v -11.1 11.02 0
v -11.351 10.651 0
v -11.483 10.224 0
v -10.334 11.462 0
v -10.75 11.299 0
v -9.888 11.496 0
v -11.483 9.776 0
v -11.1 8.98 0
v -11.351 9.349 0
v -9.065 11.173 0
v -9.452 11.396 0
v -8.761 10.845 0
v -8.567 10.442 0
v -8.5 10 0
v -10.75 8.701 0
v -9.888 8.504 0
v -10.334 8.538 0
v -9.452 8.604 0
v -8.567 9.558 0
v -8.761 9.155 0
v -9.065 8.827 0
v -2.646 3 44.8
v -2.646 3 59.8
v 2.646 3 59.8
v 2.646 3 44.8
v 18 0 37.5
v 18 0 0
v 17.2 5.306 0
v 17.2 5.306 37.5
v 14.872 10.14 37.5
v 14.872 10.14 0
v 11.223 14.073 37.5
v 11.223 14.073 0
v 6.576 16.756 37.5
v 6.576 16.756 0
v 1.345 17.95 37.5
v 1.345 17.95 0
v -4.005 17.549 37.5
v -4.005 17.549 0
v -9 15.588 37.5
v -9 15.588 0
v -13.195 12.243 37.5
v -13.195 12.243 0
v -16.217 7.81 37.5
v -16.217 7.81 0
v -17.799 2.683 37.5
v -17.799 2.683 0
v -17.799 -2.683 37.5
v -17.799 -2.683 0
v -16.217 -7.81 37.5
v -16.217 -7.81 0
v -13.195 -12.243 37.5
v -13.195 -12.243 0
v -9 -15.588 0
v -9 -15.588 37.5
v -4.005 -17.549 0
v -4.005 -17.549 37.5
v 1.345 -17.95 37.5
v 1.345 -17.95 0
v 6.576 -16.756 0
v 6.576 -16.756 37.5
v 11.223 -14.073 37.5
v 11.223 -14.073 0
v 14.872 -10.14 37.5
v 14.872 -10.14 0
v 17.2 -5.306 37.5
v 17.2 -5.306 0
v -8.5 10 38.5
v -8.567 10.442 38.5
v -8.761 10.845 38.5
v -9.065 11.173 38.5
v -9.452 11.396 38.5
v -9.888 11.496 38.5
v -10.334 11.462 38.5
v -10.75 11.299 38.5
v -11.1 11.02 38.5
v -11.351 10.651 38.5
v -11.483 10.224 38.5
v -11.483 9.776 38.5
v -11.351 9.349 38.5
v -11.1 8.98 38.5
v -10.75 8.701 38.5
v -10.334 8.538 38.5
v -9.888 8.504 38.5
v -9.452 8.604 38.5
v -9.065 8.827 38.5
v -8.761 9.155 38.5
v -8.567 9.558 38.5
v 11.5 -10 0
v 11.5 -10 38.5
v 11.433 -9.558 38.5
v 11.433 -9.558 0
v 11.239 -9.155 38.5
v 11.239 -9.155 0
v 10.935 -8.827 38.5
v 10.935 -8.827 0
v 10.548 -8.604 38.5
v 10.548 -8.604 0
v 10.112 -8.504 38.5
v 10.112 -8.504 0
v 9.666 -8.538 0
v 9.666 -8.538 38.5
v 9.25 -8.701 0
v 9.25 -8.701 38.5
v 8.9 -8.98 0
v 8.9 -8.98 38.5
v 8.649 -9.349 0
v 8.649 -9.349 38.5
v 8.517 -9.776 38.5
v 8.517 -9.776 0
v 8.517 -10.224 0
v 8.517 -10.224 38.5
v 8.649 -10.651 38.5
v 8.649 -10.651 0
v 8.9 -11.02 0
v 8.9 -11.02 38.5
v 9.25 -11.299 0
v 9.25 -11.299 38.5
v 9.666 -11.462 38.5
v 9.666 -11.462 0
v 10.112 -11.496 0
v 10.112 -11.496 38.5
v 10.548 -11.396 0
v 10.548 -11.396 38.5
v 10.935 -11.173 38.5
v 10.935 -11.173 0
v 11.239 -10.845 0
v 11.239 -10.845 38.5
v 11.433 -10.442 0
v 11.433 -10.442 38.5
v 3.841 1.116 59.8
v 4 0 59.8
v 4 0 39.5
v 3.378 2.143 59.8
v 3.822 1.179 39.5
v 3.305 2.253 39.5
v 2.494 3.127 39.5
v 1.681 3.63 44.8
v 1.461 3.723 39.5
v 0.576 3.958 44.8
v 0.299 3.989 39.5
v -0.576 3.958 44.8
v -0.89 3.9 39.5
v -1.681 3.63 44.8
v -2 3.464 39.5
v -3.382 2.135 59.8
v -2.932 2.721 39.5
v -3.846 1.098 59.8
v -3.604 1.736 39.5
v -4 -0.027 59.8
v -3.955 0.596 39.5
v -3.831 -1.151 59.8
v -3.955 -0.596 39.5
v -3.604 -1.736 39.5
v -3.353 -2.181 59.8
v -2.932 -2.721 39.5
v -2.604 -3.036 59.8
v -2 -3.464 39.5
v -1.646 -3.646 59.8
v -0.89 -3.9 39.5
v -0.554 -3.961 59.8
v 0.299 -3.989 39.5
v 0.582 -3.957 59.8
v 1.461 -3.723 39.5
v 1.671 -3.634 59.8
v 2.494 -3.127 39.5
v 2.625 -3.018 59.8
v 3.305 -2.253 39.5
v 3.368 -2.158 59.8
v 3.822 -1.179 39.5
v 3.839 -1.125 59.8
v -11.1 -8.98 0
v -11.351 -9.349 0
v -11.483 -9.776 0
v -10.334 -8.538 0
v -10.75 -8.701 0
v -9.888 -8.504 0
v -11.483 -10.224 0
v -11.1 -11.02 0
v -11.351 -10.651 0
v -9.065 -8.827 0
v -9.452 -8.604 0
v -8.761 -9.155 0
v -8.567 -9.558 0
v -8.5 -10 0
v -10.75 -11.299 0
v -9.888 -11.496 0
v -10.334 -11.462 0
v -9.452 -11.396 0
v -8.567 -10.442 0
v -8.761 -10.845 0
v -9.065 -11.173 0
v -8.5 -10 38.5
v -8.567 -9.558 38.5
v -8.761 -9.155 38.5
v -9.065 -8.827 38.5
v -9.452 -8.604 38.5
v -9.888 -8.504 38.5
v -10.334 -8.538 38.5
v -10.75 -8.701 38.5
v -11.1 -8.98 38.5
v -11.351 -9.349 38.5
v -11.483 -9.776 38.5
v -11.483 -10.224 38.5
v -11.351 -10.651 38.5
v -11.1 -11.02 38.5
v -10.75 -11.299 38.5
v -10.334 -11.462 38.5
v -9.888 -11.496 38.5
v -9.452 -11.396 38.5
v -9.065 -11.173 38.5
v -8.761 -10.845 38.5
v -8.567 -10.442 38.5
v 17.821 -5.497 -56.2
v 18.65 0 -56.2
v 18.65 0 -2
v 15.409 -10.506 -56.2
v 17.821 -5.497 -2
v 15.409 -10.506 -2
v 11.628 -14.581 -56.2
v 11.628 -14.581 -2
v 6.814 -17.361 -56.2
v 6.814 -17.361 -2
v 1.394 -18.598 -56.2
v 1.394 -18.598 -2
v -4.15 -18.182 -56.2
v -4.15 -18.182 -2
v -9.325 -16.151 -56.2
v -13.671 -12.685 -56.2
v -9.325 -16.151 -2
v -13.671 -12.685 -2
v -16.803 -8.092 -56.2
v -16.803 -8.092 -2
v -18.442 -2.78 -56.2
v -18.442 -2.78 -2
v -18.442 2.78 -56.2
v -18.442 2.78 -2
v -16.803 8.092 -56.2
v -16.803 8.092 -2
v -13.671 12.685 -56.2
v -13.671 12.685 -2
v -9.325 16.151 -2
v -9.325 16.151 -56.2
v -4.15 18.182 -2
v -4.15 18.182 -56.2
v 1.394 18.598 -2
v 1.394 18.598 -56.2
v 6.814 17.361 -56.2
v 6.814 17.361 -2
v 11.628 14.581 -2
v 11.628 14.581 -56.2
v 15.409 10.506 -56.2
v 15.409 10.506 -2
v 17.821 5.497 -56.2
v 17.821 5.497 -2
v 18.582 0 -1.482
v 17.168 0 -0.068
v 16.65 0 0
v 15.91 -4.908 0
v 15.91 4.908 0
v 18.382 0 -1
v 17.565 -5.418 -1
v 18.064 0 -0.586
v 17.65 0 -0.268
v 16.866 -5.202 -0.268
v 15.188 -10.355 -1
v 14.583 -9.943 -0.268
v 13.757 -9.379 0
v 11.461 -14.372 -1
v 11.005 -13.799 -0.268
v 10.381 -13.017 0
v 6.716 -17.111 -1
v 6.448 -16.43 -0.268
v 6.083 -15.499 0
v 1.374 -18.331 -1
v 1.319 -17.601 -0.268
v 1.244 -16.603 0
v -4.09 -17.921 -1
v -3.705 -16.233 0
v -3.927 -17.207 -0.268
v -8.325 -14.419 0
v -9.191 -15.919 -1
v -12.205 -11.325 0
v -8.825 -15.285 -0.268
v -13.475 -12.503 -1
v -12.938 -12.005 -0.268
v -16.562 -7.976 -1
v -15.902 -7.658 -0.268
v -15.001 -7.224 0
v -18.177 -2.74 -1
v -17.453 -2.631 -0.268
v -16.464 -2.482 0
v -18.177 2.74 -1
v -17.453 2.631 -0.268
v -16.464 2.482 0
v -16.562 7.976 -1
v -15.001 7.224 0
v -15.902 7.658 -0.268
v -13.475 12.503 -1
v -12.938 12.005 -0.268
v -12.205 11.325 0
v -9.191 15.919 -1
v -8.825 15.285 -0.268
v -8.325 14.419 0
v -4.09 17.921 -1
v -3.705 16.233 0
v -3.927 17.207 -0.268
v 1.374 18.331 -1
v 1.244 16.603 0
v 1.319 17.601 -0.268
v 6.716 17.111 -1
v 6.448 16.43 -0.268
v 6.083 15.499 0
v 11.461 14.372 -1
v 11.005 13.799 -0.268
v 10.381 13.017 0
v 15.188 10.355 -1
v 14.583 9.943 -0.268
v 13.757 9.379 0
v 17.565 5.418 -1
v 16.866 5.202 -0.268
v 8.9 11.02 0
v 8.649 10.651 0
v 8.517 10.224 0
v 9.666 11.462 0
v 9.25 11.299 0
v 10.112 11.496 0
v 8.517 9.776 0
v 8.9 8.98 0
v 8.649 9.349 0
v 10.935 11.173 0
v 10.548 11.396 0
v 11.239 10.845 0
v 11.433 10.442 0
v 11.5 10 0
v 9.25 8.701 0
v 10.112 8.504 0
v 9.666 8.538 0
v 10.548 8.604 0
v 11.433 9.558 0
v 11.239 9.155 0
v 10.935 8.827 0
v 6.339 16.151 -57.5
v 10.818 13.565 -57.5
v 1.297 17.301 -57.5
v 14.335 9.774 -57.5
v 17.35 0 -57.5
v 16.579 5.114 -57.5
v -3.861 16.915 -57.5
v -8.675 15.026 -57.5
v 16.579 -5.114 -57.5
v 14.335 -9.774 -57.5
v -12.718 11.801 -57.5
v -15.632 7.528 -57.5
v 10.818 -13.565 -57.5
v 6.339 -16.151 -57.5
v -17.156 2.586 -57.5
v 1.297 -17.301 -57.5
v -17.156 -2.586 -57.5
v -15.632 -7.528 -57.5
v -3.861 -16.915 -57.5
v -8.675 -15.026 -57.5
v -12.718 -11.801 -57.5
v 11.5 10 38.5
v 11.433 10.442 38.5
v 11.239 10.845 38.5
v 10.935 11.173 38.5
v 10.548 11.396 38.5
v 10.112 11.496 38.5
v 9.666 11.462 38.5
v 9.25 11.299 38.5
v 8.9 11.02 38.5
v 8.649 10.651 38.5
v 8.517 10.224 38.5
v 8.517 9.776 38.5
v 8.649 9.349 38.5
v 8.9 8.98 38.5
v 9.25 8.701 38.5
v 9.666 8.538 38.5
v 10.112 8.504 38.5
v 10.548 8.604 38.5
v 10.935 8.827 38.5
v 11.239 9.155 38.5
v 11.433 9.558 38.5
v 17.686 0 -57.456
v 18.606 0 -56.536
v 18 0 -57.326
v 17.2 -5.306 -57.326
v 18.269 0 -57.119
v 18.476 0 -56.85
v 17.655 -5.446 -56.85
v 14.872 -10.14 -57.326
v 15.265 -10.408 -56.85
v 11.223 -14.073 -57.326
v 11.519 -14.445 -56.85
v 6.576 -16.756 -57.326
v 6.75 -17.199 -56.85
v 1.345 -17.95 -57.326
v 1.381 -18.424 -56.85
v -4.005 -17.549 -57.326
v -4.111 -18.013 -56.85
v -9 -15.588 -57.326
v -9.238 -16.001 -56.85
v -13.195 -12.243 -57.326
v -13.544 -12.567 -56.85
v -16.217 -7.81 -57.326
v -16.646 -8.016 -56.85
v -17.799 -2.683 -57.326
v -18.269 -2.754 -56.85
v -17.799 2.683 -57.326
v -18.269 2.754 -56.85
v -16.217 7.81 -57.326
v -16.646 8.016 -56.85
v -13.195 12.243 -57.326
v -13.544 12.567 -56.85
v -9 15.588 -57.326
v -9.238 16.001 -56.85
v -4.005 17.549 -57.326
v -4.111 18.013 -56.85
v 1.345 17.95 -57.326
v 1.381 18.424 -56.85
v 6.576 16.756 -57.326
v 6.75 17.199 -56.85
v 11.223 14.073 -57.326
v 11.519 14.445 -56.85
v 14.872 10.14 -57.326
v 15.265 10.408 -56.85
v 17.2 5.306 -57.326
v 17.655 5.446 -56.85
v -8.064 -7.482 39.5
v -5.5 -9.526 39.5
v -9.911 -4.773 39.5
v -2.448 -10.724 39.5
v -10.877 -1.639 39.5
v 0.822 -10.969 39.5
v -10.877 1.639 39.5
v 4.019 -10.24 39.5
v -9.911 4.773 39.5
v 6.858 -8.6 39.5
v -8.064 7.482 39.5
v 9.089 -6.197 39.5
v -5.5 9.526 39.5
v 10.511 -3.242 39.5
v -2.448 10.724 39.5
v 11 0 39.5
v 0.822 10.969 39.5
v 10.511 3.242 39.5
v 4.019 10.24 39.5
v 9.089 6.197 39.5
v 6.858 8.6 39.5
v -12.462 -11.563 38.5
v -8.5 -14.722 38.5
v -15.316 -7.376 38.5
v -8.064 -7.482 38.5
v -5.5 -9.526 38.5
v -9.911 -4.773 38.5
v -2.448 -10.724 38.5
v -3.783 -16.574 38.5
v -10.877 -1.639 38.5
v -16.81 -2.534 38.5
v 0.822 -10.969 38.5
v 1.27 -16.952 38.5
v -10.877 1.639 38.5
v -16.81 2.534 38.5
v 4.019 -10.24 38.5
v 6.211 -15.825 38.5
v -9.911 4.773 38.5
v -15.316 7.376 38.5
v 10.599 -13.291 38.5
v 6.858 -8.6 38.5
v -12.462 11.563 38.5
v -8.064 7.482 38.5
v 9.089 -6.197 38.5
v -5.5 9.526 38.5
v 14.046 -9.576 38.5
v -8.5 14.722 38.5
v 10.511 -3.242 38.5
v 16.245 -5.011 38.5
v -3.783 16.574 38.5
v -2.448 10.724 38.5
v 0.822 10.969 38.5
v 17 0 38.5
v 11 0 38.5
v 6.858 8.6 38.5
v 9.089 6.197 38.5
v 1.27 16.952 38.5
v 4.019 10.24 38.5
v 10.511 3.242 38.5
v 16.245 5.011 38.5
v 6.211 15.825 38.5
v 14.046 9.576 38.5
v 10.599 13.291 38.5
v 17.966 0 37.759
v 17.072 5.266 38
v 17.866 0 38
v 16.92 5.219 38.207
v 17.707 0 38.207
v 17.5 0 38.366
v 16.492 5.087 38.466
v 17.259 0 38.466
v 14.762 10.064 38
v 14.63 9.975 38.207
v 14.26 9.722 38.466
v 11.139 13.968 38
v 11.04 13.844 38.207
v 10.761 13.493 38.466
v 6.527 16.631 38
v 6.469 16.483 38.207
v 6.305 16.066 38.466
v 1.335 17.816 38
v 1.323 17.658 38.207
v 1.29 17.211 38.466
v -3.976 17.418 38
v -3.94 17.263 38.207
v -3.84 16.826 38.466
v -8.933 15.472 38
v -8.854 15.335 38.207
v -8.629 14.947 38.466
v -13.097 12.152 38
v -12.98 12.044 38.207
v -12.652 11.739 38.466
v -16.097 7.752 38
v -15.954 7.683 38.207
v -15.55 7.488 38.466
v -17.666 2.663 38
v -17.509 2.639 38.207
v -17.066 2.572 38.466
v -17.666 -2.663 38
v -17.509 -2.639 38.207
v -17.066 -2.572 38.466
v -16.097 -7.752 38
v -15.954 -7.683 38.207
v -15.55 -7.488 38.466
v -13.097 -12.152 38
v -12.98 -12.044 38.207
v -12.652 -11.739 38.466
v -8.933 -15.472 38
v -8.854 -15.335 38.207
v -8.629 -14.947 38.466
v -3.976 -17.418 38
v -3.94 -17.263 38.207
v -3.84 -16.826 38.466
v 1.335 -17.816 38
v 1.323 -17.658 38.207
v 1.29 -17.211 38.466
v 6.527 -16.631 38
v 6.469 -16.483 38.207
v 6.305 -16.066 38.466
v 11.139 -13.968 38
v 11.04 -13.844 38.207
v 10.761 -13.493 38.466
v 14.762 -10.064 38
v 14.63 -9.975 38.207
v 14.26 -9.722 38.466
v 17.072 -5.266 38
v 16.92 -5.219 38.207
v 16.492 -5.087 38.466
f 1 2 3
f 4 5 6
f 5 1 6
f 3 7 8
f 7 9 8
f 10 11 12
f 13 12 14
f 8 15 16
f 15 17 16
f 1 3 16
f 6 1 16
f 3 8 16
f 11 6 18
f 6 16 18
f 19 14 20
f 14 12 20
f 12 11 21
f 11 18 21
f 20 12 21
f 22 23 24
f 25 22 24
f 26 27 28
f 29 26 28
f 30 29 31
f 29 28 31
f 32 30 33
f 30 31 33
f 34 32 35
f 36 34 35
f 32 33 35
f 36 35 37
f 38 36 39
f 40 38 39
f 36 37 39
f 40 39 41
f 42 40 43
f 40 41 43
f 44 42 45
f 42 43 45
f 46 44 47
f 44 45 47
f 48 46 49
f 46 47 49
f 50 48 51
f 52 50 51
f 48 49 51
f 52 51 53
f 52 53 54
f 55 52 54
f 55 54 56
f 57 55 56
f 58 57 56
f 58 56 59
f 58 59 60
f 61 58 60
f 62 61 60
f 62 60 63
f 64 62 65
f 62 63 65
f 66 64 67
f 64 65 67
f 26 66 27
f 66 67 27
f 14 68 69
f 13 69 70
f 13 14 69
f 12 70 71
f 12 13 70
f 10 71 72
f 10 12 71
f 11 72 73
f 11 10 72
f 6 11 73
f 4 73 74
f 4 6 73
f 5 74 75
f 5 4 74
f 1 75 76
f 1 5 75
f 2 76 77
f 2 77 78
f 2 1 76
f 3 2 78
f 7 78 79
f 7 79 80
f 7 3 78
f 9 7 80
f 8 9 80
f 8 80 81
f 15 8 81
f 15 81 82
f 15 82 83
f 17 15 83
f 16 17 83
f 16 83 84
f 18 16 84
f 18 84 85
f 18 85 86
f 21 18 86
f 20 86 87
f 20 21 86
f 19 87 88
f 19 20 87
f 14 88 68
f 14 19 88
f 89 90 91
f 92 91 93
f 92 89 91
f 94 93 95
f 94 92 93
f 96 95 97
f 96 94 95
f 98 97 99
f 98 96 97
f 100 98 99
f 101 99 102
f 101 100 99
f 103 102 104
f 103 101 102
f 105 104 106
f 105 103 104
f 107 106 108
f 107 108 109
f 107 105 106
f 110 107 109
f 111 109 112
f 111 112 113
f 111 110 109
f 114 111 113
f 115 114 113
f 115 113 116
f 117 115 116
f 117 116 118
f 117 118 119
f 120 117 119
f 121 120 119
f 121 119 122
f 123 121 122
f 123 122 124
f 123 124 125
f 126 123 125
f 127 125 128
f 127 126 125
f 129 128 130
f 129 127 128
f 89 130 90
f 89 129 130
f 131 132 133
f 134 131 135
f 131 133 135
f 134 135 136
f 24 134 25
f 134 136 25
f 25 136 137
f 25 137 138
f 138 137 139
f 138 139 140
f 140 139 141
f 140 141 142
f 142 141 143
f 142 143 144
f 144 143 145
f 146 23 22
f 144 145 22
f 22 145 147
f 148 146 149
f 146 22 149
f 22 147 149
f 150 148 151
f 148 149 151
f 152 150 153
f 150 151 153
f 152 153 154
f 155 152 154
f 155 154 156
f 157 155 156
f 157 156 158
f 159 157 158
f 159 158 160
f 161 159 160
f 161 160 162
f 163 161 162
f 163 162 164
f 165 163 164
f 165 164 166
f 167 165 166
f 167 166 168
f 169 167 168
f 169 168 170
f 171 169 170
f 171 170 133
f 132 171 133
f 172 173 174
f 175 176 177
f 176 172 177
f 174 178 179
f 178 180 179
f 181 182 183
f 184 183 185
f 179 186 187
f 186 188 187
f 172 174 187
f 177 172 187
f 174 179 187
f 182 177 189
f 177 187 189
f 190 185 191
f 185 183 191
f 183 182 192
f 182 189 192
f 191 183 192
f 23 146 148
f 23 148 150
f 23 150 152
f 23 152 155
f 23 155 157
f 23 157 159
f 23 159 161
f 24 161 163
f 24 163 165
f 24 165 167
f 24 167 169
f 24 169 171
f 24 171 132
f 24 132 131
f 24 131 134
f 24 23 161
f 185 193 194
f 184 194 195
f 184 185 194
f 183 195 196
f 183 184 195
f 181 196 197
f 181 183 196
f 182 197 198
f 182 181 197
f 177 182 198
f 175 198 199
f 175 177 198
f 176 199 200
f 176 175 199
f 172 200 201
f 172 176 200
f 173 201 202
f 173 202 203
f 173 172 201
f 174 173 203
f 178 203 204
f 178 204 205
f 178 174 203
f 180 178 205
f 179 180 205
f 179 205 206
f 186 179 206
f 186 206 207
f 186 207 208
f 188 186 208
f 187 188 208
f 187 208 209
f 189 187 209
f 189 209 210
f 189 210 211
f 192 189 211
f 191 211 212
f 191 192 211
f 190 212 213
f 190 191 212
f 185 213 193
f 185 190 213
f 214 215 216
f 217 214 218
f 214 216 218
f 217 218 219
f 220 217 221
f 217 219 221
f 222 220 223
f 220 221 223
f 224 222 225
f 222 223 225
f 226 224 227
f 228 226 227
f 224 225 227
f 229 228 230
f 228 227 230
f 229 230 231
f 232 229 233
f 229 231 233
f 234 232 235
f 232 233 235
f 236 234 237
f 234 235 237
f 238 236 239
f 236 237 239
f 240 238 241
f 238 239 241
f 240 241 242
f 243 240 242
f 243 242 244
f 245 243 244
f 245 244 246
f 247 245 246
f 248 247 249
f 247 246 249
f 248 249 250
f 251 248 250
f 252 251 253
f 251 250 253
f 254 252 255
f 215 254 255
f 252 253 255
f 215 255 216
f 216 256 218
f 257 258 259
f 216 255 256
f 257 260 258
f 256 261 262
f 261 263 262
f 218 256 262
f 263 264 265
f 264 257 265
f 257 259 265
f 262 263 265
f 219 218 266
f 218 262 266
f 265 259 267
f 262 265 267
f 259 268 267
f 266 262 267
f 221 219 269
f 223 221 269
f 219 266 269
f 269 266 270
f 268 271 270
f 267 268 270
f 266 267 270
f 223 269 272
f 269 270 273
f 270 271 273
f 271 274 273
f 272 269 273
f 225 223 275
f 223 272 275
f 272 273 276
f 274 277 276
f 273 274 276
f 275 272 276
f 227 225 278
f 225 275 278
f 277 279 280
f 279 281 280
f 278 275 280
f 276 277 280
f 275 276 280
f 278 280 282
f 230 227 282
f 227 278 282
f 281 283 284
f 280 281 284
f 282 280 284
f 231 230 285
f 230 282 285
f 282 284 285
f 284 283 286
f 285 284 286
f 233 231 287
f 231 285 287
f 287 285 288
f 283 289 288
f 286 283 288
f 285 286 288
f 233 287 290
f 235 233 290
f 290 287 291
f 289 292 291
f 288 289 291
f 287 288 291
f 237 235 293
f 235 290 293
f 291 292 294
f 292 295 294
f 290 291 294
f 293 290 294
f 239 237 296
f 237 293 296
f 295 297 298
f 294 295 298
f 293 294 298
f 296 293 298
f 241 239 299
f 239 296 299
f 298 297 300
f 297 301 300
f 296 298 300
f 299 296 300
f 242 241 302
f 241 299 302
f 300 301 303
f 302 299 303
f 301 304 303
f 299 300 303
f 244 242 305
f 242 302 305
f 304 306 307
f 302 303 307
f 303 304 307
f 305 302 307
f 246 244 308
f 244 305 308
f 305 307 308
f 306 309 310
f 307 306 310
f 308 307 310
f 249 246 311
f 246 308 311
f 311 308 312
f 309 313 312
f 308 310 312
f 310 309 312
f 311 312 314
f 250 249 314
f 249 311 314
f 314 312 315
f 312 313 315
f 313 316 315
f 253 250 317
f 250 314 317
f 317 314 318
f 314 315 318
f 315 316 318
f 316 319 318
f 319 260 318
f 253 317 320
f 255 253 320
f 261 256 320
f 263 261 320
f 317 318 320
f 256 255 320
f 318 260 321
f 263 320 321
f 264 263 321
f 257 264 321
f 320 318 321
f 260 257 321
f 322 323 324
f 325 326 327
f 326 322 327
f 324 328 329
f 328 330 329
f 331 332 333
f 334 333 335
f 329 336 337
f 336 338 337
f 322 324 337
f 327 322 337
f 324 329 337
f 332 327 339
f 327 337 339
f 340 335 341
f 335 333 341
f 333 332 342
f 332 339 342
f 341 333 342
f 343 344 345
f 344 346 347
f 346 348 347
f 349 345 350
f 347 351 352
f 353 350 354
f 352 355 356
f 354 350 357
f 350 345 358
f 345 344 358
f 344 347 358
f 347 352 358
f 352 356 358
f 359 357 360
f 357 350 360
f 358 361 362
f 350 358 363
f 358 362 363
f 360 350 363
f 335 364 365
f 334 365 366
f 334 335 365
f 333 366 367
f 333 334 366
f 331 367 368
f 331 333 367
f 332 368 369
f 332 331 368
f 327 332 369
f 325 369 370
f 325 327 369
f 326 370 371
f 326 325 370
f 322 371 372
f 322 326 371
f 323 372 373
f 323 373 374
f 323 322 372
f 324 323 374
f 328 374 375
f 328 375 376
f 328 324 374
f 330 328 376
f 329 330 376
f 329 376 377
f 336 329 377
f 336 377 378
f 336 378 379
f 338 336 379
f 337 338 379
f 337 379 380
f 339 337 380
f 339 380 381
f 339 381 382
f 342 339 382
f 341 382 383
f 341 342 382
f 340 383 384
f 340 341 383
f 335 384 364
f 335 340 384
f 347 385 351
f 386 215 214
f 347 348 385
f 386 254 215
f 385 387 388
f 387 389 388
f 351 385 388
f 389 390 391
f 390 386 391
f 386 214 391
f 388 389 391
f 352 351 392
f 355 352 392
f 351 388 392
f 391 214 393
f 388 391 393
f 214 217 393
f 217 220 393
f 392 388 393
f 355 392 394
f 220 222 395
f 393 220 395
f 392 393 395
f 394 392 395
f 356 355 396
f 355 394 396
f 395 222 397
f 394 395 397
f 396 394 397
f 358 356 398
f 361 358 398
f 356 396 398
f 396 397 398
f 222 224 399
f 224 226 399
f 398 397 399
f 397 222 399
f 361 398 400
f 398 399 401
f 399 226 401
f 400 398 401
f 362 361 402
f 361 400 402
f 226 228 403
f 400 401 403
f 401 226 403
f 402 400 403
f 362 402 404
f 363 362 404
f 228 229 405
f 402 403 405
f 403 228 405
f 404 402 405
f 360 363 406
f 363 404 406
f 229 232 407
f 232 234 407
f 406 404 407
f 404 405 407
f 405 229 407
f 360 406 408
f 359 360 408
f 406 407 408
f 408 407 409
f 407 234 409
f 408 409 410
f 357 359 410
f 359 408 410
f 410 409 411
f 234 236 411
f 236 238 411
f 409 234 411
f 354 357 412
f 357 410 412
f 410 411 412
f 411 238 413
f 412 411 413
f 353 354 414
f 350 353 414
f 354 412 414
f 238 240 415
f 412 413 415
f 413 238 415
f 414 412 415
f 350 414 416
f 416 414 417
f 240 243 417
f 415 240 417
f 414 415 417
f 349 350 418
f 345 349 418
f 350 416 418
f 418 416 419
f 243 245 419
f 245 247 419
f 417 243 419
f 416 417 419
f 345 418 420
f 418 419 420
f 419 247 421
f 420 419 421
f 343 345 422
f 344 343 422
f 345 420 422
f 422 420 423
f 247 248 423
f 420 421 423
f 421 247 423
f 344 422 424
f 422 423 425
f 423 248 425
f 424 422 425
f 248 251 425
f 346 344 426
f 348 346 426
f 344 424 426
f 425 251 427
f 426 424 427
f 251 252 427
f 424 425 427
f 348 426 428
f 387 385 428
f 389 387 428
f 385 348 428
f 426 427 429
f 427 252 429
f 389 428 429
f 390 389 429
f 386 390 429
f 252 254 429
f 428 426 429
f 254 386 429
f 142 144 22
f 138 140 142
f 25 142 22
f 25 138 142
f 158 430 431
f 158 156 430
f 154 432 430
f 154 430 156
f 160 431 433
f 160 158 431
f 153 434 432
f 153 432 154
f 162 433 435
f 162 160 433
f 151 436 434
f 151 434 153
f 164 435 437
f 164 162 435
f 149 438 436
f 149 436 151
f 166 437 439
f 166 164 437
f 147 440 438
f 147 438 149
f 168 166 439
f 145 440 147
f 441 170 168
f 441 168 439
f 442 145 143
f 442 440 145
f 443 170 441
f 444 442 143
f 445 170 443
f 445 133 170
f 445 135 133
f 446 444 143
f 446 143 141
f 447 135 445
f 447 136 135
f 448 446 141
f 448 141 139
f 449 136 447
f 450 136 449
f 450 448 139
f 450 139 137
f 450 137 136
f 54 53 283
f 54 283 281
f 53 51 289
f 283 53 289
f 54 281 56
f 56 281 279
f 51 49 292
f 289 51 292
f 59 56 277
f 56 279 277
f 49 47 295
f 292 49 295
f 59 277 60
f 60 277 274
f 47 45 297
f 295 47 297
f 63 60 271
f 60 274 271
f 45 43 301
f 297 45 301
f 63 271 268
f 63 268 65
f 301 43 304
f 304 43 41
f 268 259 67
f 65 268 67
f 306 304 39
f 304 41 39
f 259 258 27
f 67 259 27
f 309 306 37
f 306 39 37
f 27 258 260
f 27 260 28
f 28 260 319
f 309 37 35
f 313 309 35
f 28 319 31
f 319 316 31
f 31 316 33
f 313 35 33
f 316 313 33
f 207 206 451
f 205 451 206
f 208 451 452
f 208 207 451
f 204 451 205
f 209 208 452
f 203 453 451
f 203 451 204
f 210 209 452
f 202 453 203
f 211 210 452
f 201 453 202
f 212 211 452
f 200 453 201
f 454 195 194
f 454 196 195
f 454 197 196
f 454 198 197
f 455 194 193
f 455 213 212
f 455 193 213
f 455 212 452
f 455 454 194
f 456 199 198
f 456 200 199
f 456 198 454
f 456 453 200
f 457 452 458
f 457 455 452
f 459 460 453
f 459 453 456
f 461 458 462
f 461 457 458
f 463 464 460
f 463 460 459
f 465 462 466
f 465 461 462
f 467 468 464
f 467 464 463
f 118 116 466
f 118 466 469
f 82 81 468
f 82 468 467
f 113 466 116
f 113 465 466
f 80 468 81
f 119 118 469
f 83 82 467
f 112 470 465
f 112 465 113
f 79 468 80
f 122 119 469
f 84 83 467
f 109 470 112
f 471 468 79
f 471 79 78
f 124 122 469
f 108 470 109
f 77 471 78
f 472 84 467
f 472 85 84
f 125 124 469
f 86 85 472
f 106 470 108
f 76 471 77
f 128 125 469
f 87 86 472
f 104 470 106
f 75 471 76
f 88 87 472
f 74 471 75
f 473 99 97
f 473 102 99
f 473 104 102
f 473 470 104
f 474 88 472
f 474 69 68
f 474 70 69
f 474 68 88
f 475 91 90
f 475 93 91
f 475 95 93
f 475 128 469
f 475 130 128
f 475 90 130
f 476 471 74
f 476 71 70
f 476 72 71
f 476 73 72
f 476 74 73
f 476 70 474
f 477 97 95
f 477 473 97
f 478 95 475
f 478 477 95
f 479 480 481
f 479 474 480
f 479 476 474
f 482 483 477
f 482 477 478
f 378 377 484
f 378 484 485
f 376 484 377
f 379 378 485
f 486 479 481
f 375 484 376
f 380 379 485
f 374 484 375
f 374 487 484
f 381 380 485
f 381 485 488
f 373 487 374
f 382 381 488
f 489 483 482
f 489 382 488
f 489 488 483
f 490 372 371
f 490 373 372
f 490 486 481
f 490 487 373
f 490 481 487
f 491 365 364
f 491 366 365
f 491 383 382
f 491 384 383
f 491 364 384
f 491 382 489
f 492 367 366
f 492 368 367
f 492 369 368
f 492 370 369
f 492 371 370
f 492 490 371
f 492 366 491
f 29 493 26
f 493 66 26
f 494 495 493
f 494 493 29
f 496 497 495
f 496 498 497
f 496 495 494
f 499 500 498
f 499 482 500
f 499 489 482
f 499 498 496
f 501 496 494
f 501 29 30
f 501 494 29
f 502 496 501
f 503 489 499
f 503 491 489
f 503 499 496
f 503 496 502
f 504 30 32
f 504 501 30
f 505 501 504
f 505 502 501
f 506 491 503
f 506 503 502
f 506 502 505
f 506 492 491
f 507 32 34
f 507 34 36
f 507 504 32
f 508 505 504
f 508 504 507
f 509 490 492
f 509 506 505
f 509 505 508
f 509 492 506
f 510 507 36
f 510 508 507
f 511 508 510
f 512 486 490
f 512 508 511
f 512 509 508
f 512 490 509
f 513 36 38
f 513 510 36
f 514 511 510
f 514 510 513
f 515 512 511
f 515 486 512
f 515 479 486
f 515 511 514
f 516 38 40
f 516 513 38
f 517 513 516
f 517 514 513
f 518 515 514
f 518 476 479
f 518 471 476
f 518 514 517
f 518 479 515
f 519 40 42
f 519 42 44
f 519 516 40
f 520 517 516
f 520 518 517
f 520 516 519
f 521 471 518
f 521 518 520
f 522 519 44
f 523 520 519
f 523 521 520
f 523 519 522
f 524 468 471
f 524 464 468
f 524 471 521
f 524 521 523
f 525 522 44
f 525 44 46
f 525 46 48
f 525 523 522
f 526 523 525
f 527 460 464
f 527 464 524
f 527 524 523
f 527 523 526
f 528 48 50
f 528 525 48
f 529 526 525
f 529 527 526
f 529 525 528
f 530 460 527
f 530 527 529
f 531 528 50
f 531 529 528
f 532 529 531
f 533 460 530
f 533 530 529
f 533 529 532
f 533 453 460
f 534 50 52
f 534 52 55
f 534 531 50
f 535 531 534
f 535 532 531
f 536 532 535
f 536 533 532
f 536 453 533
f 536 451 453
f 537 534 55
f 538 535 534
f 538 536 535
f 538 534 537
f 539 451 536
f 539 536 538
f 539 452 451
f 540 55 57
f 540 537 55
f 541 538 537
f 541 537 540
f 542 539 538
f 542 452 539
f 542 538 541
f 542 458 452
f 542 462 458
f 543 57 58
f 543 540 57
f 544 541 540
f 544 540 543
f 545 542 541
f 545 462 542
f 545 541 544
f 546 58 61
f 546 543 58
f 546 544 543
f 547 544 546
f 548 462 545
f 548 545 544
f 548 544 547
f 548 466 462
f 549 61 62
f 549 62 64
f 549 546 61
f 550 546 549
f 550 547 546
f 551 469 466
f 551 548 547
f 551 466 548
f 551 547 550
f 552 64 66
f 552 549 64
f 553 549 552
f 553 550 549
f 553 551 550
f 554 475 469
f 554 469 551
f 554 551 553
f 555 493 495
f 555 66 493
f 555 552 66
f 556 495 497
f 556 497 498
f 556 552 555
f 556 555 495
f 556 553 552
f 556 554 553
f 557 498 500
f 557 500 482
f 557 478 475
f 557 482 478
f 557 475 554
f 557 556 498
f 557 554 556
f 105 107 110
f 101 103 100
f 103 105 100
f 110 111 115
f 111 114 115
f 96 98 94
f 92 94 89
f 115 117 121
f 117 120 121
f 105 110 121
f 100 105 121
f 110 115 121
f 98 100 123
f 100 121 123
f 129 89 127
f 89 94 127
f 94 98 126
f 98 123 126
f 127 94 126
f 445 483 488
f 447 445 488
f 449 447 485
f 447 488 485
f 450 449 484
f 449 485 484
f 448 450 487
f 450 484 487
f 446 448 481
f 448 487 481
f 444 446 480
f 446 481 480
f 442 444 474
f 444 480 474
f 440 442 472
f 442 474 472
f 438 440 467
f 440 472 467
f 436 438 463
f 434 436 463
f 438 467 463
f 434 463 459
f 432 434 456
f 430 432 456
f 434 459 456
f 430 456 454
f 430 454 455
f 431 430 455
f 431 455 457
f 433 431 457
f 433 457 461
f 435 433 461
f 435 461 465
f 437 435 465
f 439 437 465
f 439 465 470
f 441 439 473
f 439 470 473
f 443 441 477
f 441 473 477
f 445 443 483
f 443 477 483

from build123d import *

# Parameters (mm, degrees)
SKETCH1_R           = 18
SKETCH1_R_2         = 1.5
GEARBOX_DEPTH       = 38.5
SKETCH3_R           = 4
BOSS_EXTRUDE2_DEPTH = 21.3
SKETCH4_W           = 5.291502622
SKETCH4_H           = 1
CUT_EXTRUDE1_DEPTH  = 15
FILLET1_R           = 1
SKETCH5_R           = 11
BOSS_EXTRUDE3_DEPTH = 1


with BuildPart() as part:
    # Sketch1 → GearBox (new body)
    with BuildSketch(Plane.XY):
        Circle(SKETCH1_R)
        with Locations((-10, 10)):
            Circle(SKETCH1_R_2, mode=Mode.SUBTRACT)
        with Locations((10, 10)):
            Circle(SKETCH1_R_2, mode=Mode.SUBTRACT)
        with Locations((10, -10)):
            Circle(SKETCH1_R_2, mode=Mode.SUBTRACT)
        with Locations((-10, -10)):
            Circle(SKETCH1_R_2, mode=Mode.SUBTRACT)
    extrude(amount=GEARBOX_DEPTH)

    # Sketch2 → Motor (revolve)
    with BuildSketch(Plane(origin=(0, 0, 0), x_dir=(0, 0, -1), z_dir=(1, 0, 0)), mode=Mode.PRIVATE) as motor_sk:
        with BuildLine():
            Line((0, 0), (57.5, 0))
            Line((57.5, 0), (57.5, 17.35))
            ThreePointArc((57.5, 17.35), (57.119238816, 18.269238816), (56.2, 18.65))
            Line((56.2, 18.65), (2, 18.65))
            ThreePointArc((2, 18.65), (0.585786438, 18.064213562), (0, 16.65))
            Line((0, 16.65), (0, 0))
        make_face()
    revolve(motor_sk.sketch.rotate(Axis((0, 0, 1000), (0, 0, -1)), 90), axis=Axis((0, 0, 1000), (0, 0, -1)))

    # Sketch3 → Boss-Extrude2 (add)
    with BuildSketch(Plane.XY.offset(38.5)):
        Circle(SKETCH3_R)
    extrude(amount=BOSS_EXTRUDE2_DEPTH)

    # Sketch4 → Cut-Extrude1 (cut)
    with BuildSketch(Plane.XY.offset(59.8)):
        with Locations((0, 3.5)):
            Rectangle(SKETCH4_W, SKETCH4_H)
    extrude(amount=-CUT_EXTRUDE1_DEPTH, mode=Mode.SUBTRACT)

    # Fillet1
    fillet1_edges = [part.edges().sort_by_distance(p)[0] for p in [
        (-18, 0, 38.5),
    ]]
    fillet(fillet1_edges, radius=FILLET1_R)

    # Sketch5 → Boss-Extrude3 (add)
    with BuildSketch(Plane.XY.offset(38.5)):
        Circle(SKETCH5_R)
    extrude(amount=BOSS_EXTRUDE3_DEPTH)


solid = part.part
